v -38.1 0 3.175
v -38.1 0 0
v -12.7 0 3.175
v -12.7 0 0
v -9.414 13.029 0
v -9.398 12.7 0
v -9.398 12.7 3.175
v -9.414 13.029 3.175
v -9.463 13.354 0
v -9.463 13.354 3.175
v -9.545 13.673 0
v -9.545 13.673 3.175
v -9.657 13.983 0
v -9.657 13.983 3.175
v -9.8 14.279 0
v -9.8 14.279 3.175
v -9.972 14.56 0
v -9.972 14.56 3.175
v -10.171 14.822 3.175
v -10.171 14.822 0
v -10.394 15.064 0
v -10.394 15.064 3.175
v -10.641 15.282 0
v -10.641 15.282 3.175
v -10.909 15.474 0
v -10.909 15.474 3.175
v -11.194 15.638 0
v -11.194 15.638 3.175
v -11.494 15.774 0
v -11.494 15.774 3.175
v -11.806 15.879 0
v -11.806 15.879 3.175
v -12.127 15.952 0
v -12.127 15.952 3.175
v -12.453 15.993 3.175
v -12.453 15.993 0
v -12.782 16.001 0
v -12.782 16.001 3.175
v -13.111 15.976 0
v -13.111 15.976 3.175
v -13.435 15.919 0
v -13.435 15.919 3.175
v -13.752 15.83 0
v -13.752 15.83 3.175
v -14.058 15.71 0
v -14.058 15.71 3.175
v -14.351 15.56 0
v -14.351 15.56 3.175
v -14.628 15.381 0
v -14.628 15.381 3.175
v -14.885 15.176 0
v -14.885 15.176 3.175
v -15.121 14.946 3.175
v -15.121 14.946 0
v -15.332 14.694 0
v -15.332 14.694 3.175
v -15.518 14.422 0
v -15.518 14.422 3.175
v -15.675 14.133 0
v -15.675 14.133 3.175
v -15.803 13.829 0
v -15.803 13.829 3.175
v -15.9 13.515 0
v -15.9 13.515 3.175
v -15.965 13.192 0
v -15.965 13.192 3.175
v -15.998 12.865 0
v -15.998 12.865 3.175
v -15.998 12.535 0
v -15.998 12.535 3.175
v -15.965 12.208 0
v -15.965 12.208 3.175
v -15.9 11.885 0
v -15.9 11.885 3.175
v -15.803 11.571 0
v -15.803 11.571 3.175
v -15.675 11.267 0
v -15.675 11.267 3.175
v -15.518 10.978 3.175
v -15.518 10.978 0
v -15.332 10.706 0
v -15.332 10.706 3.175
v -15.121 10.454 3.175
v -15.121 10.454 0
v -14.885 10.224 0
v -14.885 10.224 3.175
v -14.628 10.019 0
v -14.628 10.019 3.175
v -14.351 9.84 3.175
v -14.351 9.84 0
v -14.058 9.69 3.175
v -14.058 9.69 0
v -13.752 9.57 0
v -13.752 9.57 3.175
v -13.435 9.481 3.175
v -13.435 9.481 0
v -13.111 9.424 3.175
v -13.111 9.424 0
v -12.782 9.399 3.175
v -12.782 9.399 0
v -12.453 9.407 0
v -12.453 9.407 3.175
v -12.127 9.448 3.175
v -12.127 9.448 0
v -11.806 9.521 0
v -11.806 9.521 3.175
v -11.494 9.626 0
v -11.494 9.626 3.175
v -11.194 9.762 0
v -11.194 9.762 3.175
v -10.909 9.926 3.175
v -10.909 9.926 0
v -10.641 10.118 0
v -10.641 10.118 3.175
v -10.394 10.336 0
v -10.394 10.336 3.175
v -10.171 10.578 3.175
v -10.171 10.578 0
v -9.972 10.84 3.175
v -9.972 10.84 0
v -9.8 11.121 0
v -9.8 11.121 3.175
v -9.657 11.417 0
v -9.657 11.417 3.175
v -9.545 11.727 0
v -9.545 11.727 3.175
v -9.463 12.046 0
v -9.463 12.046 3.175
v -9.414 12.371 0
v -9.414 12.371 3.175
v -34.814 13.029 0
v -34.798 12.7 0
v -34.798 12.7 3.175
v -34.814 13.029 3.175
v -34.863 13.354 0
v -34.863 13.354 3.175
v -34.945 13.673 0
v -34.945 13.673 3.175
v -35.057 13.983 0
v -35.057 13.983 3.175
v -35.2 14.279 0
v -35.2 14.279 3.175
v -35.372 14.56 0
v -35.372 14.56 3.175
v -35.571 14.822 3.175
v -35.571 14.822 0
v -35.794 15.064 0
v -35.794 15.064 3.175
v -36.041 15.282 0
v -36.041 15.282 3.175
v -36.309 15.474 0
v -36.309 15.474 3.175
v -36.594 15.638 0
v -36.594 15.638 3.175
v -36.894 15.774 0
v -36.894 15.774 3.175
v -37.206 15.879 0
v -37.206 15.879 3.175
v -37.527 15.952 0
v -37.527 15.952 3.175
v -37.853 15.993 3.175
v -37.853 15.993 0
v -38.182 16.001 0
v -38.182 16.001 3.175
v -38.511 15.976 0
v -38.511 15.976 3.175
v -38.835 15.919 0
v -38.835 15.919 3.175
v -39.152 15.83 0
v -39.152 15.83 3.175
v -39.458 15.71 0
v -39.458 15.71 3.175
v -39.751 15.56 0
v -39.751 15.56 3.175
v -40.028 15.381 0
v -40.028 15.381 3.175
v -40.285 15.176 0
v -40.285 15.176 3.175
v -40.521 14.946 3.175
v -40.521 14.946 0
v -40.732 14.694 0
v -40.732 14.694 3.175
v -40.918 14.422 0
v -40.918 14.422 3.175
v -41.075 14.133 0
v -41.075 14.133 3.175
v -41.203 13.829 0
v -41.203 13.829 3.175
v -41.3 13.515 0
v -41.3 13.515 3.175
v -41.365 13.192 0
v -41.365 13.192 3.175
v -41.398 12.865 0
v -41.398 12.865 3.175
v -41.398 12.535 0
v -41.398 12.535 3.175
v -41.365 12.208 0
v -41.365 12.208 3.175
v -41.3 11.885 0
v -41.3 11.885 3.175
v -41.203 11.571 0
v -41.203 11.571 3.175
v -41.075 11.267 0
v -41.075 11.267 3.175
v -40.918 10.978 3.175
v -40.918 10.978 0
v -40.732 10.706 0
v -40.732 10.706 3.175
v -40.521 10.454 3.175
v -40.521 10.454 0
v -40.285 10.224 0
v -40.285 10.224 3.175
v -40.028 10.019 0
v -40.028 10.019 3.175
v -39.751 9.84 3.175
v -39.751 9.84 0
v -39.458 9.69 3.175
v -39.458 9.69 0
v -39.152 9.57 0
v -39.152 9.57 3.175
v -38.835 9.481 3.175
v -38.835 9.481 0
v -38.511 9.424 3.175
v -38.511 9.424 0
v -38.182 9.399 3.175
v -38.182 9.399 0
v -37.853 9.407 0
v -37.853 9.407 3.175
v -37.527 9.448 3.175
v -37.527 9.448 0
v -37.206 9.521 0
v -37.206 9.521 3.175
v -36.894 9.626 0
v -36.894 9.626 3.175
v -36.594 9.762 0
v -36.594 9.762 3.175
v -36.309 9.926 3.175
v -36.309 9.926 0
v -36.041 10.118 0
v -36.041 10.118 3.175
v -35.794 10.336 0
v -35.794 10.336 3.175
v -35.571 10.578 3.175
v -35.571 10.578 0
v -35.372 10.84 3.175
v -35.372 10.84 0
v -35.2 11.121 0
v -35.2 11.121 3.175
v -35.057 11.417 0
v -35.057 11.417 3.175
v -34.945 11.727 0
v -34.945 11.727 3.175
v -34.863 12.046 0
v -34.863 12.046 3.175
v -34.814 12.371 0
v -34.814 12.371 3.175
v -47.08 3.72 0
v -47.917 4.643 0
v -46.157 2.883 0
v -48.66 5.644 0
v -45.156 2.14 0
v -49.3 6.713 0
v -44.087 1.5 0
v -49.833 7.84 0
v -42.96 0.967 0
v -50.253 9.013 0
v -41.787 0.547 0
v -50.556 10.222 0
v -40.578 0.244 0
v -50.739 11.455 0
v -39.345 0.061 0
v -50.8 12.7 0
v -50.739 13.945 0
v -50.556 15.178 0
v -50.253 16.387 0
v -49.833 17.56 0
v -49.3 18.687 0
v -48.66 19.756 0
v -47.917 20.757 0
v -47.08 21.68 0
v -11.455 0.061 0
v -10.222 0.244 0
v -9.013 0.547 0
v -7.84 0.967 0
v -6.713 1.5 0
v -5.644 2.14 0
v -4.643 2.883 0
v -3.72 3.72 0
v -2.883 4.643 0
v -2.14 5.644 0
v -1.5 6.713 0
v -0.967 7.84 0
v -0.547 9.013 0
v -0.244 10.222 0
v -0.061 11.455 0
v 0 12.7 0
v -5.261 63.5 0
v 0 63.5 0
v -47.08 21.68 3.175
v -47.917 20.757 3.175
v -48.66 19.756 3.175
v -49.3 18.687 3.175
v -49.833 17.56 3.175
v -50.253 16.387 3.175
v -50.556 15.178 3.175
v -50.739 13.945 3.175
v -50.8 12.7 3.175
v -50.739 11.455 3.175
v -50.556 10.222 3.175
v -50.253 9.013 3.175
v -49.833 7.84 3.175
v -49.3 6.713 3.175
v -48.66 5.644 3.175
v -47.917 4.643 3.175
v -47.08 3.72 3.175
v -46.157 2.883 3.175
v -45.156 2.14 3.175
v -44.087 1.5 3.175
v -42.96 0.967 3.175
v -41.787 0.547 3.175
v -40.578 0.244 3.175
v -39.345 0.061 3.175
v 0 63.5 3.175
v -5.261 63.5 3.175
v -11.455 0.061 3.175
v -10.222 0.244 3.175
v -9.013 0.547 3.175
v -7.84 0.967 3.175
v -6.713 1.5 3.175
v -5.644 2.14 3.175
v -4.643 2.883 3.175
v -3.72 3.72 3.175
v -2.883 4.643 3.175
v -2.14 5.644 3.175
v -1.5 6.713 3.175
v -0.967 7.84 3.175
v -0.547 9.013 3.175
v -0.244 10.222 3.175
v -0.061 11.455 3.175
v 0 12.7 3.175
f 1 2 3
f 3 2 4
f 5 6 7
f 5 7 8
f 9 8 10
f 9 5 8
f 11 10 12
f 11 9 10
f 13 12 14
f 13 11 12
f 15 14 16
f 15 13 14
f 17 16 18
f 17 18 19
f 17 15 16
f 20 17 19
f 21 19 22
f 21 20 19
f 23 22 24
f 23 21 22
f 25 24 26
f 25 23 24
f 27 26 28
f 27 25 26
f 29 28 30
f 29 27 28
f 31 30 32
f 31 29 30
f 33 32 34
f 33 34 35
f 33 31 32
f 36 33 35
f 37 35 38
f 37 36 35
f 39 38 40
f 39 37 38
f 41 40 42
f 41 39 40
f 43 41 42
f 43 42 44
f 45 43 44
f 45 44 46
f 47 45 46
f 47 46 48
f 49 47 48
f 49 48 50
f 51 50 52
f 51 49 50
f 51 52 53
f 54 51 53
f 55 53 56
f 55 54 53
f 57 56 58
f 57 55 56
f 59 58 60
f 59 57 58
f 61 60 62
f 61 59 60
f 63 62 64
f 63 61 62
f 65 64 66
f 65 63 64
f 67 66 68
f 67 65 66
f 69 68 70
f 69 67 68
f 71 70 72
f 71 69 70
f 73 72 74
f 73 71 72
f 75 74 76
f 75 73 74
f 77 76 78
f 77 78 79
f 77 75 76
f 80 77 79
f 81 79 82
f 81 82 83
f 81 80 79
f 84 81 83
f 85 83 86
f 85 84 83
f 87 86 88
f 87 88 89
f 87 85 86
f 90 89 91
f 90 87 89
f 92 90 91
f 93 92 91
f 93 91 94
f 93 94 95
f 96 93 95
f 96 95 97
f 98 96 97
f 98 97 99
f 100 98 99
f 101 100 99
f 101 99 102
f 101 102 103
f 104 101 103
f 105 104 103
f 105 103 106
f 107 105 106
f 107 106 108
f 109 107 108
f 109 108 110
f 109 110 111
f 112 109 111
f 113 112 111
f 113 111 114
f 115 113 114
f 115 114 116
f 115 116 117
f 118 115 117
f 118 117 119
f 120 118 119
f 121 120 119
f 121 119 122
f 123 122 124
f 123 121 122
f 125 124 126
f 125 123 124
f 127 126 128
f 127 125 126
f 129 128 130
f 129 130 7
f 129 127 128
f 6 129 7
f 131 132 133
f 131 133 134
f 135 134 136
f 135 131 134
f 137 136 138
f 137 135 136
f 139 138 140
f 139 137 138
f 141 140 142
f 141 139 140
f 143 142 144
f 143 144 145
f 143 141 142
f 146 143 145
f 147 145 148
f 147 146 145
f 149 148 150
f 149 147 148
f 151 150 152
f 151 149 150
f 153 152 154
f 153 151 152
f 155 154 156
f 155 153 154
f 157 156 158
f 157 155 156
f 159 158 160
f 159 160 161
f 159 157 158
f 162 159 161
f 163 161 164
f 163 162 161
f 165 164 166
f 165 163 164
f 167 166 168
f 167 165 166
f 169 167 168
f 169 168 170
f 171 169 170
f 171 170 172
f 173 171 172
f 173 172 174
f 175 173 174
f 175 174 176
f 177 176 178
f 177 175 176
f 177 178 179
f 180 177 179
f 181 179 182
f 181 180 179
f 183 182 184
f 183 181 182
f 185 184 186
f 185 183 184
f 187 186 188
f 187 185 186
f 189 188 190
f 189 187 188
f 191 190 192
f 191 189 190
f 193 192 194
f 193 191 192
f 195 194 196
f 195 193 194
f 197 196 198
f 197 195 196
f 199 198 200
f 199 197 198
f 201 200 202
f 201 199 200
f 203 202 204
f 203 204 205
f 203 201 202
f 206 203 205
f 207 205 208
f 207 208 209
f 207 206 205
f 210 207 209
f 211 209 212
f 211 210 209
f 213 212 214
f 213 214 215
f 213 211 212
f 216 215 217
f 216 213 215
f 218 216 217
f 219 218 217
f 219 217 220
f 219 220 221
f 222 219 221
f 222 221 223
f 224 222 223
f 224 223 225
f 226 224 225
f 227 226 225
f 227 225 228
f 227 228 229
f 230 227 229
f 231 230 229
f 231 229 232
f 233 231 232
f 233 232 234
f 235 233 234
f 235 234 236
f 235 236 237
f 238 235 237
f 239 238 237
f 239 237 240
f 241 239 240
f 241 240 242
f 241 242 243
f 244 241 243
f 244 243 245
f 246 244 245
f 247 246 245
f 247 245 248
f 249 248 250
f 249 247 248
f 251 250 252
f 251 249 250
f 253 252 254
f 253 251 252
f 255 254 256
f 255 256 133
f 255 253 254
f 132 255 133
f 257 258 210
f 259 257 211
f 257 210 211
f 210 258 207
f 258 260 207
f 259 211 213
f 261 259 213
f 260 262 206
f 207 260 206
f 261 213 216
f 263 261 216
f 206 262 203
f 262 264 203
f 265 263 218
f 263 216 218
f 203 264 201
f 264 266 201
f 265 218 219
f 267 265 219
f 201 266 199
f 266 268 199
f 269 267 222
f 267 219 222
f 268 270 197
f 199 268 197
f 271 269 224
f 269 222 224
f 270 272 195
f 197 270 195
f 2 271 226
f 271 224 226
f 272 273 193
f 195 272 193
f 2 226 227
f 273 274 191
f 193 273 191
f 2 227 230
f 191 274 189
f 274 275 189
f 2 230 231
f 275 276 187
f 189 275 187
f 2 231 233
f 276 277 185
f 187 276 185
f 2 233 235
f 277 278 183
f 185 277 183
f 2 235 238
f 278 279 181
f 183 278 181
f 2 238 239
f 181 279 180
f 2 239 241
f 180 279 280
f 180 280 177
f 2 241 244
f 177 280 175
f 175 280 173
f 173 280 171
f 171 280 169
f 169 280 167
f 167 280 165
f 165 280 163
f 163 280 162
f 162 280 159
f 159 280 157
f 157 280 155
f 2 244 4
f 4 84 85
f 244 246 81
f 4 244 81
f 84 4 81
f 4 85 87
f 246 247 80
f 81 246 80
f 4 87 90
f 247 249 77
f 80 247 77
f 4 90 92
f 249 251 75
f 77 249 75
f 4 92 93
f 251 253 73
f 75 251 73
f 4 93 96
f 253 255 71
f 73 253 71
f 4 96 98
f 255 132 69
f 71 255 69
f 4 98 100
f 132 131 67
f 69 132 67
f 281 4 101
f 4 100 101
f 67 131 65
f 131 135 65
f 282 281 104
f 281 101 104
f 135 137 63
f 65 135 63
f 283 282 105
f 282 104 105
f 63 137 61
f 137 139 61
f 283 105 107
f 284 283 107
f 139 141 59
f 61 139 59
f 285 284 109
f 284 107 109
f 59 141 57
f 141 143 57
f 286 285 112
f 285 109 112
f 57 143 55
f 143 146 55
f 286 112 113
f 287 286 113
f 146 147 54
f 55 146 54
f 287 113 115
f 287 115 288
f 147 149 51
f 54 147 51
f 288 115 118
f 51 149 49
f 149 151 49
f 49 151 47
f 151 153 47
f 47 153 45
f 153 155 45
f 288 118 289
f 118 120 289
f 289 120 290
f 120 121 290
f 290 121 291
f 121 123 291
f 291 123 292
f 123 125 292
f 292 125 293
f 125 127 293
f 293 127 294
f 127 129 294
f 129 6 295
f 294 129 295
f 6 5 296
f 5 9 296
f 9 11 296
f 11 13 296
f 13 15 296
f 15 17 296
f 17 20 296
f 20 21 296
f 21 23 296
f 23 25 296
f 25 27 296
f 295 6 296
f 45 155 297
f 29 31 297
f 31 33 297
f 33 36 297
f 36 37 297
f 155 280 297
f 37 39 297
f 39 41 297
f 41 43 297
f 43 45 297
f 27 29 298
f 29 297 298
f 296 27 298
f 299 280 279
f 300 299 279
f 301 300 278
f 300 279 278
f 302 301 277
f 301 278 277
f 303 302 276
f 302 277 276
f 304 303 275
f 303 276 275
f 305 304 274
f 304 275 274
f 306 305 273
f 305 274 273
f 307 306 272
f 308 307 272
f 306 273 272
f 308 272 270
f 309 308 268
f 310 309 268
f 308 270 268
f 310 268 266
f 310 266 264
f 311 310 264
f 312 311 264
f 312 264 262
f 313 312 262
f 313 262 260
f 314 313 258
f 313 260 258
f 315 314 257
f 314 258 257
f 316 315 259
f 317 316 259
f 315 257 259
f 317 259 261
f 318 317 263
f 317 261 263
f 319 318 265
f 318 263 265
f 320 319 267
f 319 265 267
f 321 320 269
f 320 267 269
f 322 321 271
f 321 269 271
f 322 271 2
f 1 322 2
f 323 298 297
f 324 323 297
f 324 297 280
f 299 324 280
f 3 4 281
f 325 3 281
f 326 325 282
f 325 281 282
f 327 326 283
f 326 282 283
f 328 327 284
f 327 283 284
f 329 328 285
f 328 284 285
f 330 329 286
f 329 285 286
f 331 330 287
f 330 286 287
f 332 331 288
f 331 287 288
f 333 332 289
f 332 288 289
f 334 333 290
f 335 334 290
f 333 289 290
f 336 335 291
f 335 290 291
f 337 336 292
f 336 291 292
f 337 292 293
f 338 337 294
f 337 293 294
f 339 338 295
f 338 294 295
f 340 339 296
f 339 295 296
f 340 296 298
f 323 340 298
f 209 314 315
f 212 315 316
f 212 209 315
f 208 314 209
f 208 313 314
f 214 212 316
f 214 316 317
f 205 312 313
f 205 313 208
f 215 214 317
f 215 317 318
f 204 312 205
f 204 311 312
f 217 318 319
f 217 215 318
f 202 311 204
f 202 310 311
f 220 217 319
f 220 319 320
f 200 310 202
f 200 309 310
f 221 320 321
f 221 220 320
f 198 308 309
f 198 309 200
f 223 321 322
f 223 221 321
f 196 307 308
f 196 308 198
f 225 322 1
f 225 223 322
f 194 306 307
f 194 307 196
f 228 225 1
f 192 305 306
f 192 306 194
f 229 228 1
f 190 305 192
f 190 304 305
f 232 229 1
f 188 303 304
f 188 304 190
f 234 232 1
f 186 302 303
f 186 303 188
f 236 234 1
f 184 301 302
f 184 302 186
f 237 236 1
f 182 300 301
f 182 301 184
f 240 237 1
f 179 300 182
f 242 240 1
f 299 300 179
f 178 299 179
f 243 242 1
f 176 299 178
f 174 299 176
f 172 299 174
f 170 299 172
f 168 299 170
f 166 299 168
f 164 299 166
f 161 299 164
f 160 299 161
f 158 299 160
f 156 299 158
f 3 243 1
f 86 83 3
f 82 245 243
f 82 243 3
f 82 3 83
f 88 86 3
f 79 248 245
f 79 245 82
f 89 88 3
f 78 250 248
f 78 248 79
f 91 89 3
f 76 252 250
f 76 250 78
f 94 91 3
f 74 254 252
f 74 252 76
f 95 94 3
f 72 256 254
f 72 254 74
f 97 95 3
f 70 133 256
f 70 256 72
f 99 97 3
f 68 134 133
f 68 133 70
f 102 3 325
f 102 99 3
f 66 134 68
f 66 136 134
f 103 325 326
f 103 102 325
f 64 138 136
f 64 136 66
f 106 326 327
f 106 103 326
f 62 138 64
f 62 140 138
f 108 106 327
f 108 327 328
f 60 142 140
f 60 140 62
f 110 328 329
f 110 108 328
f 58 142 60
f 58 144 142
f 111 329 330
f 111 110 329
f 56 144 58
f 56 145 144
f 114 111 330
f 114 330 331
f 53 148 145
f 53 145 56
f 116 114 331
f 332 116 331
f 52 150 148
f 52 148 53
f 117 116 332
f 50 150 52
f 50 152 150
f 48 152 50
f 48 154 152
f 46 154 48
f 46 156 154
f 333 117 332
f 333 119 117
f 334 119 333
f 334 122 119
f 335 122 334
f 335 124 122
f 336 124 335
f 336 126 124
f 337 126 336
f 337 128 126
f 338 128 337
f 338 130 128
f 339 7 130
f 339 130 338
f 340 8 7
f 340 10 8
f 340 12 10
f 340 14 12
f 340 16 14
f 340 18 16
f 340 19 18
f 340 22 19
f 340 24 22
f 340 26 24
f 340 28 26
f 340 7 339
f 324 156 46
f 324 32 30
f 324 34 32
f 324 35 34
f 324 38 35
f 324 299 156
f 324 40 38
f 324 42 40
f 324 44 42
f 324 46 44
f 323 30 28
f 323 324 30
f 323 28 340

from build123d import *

# Parameters (mm, degrees)
F0_R     = 3.302
F1_DEPTH = 3.175


with BuildPart() as f1:
    # F0 (on Top) → F1 (new body)
    with BuildSketch(Plane.XY):
        with BuildLine():
            Line((-5.260512, 63.5), (-47.080256, 21.680256))
            ThreePointArc((-47.080256, 21.680256), (-49.83327, 7.83992), (-38.1, 0))
            Line((-38.1, 0), (-12.7, 0))
            ThreePointArc((-12.7, 0), (-3.719744, 3.719744), (0, 12.7))
            Line((0, 12.7), (0, 63.5))
            Line((0, 63.5), (-5.260512, 63.5))
        make_face()
        with Locations((-38.1, 12.7)):
            Circle(F0_R, mode=Mode.SUBTRACT)
        with Locations((-12.7, 12.7)):
            Circle(F0_R, mode=Mode.SUBTRACT)
    extrude(amount=F1_DEPTH)


solid = f1.part
